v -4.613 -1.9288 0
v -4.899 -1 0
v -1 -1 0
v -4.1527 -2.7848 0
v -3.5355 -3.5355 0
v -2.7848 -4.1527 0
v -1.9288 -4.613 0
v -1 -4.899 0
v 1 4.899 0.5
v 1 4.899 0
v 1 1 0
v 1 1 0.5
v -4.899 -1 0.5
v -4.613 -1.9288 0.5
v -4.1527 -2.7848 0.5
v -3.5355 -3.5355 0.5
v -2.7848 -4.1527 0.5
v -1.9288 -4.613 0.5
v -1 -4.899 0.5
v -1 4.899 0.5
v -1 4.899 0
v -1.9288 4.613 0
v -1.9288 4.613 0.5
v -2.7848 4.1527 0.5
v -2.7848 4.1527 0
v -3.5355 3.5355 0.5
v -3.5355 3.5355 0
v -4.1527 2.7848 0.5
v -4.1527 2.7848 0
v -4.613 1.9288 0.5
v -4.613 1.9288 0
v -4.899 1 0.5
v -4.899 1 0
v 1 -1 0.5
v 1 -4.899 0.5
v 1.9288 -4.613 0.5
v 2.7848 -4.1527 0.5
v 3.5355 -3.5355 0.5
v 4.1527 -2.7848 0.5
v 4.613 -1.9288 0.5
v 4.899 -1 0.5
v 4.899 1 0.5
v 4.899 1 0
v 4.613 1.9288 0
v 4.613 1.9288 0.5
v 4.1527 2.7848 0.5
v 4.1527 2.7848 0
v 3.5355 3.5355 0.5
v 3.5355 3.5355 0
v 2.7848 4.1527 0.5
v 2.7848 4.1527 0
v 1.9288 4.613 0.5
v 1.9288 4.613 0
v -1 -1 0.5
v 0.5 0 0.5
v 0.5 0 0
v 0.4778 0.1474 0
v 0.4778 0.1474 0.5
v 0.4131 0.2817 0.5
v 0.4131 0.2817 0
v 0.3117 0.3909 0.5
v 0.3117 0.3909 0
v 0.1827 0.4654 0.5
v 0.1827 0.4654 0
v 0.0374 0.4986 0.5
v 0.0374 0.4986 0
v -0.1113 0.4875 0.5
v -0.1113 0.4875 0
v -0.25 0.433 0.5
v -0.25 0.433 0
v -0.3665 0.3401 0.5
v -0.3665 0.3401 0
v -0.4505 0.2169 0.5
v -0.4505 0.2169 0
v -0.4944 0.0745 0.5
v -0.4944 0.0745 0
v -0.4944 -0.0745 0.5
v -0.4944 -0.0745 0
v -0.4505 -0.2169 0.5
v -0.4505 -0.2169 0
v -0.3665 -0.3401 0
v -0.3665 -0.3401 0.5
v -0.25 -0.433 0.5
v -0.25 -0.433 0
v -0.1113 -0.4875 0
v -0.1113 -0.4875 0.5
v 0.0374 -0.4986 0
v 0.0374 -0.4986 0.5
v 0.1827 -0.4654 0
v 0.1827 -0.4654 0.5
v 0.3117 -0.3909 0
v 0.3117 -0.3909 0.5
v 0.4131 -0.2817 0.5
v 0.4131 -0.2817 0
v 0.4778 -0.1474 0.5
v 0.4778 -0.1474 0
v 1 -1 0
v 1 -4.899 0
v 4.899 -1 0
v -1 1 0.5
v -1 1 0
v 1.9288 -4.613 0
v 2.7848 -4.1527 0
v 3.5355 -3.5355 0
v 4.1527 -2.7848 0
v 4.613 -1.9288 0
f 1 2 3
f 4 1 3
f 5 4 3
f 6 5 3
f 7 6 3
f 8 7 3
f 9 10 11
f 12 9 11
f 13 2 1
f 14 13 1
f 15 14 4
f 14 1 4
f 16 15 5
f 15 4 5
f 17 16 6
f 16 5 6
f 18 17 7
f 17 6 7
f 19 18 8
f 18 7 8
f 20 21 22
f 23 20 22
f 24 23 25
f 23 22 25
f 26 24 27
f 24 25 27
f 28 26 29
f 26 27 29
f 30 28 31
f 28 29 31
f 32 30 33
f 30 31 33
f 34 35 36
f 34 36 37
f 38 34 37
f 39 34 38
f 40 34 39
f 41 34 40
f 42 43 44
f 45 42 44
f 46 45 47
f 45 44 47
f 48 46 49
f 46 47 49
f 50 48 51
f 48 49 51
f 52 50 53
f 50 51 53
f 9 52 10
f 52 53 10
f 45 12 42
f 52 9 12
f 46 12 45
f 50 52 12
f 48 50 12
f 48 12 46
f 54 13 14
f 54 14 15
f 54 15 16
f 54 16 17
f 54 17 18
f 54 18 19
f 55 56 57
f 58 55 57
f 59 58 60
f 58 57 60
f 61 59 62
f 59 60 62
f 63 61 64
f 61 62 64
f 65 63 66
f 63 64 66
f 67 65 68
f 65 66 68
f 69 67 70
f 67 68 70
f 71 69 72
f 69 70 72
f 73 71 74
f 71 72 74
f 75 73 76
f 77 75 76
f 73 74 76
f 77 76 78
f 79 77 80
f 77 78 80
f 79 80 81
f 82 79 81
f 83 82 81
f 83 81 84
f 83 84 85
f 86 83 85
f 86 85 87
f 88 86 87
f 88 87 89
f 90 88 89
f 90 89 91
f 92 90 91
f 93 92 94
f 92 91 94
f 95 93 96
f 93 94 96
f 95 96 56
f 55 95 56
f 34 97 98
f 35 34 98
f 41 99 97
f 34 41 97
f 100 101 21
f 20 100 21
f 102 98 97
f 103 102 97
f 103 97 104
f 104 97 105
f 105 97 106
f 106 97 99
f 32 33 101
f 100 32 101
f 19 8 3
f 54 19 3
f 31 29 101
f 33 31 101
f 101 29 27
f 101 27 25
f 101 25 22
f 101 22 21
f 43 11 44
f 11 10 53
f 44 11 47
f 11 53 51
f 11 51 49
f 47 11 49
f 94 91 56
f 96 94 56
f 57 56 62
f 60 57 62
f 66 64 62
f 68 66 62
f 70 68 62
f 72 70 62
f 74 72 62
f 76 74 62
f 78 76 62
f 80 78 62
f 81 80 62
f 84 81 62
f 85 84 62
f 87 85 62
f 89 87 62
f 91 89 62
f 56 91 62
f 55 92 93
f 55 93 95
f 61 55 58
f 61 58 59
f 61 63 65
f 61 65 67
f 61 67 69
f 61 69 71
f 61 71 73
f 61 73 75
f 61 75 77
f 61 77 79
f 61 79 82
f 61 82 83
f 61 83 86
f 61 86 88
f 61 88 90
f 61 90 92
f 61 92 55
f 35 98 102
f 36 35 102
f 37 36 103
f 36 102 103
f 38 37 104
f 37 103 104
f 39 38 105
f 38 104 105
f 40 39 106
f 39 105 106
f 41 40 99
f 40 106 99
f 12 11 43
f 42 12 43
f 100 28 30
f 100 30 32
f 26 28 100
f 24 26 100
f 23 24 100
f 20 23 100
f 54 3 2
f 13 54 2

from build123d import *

# Parameters (mm, degrees)
F0_R     = 0.5
F1_DEPTH = 0.5


with BuildPart() as f1:
    # F0 (on Top) → F1 (new body)
    with BuildSketch(Plane.XY):
        Circle(F0_R)
    extrude(amount=F1_DEPTH)


with BuildPart() as f1b:
    # F0 (on Top) → F1, piece 2 (new body)
    with BuildSketch(Plane.XY):
        with BuildLine():
            Line((-1, 1), (-1, 4.8989794856))
            ThreePointArc((-1, 4.8989794856), (-3.5355339059, 3.5355339059), (-4.8989794856, 1))
            Line((-4.8989794856, 1), (-1, 1))
        make_face()
    extrude(amount=F1_DEPTH)


with BuildPart() as f1c:
    # F0 (on Top) → F1, piece 3 (new body)
    with BuildSketch(Plane.XY):
        with BuildLine():
            Line((1, 1), (4.8989794856, 1))
            ThreePointArc((4.8989794856, 1), (3.5355339059, 3.5355339059), (1, 4.8989794856))
            Line((1, 4.8989794856), (1, 1))
        make_face()
    extrude(amount=F1_DEPTH)


with BuildPart() as f1d:
    # F0 (on Top) → F1, piece 4 (new body)
    with BuildSketch(Plane.XY):
        with BuildLine():
            ThreePointArc((1, -4.8989794856), (3.5355339059, -3.5355339059), (4.8989794856, -1))
            Line((4.8989794856, -1), (1, -1))
            Line((1, -1), (1, -4.8989794856))
        make_face()
    extrude(amount=F1_DEPTH)


with BuildPart() as f1e:
    # F0 (on Top) → F1, piece 5 (new body)
    with BuildSketch(Plane.XY):
        with BuildLine():
            ThreePointArc((-4.8989794856, -1), (-3.5355339059, -3.5355339059), (-1, -4.8989794856))
            Line((-1, -4.8989794856), (-1, -1))
            Line((-1, -1), (-4.8989794856, -1))
        make_face()
    extrude(amount=F1_DEPTH)


solid = Compound([f1.part, f1b.part, f1c.part, f1d.part, f1e.part])
